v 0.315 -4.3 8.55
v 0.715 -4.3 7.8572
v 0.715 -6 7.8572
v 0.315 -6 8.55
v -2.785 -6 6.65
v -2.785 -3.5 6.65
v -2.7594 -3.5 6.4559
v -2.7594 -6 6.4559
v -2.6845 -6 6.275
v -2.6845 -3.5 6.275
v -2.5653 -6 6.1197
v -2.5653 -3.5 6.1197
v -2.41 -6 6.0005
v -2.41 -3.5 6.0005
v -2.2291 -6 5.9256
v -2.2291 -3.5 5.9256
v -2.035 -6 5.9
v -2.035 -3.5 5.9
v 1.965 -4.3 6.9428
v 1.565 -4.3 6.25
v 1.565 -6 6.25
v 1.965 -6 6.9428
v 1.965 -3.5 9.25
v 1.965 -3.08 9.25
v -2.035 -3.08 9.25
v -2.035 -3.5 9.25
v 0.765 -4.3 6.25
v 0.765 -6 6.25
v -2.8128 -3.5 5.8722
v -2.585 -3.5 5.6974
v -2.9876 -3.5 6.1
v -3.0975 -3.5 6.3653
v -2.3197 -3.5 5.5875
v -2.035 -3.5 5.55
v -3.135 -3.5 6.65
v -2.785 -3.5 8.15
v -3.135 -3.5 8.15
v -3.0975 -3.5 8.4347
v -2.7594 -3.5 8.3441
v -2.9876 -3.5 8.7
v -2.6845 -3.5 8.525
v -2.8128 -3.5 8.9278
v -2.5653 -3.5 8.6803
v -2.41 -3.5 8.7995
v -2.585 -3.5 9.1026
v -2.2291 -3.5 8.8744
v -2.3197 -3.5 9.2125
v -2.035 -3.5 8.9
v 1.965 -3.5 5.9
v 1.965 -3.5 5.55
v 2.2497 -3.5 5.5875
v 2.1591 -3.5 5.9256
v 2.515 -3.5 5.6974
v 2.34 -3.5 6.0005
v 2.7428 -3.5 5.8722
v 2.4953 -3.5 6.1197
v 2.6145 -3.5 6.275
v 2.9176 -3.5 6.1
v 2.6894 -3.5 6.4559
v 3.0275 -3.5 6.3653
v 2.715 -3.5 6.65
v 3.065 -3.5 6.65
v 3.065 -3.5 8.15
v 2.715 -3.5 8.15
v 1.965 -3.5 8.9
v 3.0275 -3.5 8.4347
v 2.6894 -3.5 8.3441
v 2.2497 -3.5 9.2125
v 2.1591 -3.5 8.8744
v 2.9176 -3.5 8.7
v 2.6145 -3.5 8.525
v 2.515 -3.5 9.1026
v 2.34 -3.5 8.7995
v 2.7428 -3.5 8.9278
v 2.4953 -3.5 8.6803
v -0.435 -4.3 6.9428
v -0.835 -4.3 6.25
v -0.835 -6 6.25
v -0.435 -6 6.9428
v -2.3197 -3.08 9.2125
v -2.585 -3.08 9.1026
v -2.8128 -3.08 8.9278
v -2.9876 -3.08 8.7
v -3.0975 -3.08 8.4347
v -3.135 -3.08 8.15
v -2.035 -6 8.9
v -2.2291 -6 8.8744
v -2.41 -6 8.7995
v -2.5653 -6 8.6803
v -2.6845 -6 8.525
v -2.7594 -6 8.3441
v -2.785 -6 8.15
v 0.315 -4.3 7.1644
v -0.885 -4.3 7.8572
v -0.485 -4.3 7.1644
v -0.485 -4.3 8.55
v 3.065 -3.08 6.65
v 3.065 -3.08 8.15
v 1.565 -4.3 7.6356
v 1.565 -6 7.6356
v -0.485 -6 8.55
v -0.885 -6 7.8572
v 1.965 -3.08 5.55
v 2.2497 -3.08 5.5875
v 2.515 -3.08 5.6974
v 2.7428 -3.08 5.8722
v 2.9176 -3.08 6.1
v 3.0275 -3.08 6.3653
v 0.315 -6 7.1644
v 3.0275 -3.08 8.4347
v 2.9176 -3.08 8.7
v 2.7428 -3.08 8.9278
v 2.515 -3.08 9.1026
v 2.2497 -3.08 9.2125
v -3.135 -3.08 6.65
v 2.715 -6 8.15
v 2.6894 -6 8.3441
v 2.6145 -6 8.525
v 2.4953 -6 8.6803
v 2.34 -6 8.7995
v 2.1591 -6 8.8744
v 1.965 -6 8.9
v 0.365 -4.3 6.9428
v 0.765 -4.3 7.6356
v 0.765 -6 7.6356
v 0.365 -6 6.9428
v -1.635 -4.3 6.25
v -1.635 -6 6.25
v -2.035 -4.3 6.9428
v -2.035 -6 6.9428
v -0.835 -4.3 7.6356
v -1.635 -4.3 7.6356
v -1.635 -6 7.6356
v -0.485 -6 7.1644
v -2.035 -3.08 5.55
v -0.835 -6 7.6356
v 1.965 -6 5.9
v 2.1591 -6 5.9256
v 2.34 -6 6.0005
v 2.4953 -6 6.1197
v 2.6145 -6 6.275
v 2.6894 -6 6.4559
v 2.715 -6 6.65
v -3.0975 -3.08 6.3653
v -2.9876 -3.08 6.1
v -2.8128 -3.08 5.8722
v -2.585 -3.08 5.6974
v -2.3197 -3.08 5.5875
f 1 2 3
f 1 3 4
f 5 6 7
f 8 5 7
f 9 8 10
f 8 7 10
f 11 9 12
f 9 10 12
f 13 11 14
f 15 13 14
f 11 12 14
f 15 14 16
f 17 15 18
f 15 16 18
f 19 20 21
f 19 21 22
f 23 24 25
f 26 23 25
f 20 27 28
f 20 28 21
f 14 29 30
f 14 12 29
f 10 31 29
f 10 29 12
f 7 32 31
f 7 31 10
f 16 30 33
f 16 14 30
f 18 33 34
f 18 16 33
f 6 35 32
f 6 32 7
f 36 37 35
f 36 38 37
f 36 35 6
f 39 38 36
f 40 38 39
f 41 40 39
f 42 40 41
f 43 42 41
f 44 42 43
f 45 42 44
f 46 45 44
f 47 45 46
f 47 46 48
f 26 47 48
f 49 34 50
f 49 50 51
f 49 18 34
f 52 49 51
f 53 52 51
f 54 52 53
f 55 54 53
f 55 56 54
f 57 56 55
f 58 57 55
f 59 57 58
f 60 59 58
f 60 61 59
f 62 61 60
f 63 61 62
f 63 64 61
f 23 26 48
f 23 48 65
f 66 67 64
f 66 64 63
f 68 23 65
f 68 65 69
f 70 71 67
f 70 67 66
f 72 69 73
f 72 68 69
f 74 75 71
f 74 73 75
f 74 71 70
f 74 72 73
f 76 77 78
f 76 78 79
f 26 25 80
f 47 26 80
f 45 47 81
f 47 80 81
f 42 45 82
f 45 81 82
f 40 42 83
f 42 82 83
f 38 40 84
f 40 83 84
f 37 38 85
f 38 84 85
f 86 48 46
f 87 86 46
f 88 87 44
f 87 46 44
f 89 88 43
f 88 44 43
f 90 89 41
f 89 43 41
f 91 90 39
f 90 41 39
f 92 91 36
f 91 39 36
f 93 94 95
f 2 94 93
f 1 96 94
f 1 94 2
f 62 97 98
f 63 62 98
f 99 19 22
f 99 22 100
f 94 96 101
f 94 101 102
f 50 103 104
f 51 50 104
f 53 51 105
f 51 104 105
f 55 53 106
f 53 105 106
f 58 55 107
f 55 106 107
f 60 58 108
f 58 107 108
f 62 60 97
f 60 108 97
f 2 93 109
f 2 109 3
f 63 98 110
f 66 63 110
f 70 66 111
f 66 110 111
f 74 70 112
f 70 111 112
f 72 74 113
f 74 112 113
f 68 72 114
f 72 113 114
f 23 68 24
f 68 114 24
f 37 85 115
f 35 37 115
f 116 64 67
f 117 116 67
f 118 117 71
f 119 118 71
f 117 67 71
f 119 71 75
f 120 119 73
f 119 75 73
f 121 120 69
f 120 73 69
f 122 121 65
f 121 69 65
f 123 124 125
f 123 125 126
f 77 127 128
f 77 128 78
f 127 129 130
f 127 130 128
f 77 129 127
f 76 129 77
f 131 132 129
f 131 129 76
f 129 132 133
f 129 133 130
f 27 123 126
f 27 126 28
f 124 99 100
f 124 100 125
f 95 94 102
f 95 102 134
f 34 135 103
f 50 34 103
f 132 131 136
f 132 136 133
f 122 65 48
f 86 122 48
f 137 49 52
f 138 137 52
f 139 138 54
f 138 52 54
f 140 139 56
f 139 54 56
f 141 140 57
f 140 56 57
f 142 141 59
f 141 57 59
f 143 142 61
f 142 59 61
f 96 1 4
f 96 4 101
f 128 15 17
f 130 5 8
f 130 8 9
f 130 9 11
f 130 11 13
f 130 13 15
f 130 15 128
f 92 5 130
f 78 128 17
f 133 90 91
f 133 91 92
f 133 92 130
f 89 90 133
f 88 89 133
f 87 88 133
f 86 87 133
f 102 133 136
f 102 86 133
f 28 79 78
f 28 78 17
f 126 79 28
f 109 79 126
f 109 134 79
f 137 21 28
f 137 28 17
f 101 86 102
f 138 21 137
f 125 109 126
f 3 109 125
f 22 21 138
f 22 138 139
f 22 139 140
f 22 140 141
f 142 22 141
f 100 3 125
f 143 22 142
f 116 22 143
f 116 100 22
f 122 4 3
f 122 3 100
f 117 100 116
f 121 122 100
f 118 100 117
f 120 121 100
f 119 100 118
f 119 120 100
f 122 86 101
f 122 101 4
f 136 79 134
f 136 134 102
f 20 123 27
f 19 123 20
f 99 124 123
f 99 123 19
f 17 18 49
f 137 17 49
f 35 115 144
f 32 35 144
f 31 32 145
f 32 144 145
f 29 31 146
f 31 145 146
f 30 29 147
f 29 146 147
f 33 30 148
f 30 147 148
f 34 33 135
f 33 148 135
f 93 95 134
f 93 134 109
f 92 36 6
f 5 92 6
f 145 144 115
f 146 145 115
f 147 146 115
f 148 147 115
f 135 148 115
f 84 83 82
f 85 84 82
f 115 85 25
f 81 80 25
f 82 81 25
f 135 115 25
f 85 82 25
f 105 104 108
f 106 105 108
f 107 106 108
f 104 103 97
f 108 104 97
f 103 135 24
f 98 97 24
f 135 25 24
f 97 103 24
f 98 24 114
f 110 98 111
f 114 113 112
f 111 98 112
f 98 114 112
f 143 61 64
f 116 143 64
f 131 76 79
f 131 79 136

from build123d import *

# Parameters (mm, degrees)
PAD010_START    = 3.08
PAD010_DEPTH    = 0.42
PAD011_START    = 3.5
PAD011_DEPTH    = 2.5
POCKET013_START = 4.3
POCKET013_DEPTH = 5.7


with BuildPart() as part:
    # Sketch026 → Pad010 (new body)
    with BuildSketch(Plane.XZ.offset(PAD010_START)):
        with BuildLine():
            Line((6.164998, 8.15), (6.164998, 6.65))
            ThreePointArc((6.164998, 6.65), (6.48718, 5.872183), (7.264998, 5.55))
            Line((7.264998, 5.55), (11.264998, 5.55))
            ThreePointArc((11.264998, 5.55), (12.042815, 5.872183), (12.364998, 6.65))
            Line((12.364998, 6.65), (12.364998, 8.15))
            ThreePointArc((12.364998, 8.15), (12.042815, 8.927817), (11.264998, 9.25))
            Line((11.264998, 9.25), (7.264998, 9.25))
            ThreePointArc((7.264998, 9.25), (6.48718, 8.927817), (6.164998, 8.15))
        make_face()
    extrude(amount=PAD010_DEPTH)

    # Sketch027 → Pad011 (join)
    with BuildSketch(Plane.XZ.offset(PAD011_START)):
        with BuildLine():
            Line((6.514998, 8.15), (6.514998, 6.65))
            ThreePointArc((6.514998, 6.65), (6.734668, 6.11967), (7.264998, 5.9))
            Line((7.264998, 5.9), (11.264998, 5.9))
            ThreePointArc((11.264998, 5.9), (11.795328, 6.11967), (12.014998, 6.65))
            Line((12.014998, 6.65), (12.014998, 8.15))
            ThreePointArc((12.014998, 8.15), (11.795328, 8.68033), (11.264998, 8.9))
            Line((11.264998, 8.9), (7.264998, 8.9))
            ThreePointArc((7.264998, 8.9), (6.734668, 8.68033), (6.514998, 8.15))
        make_face()
    extrude(amount=PAD011_DEPTH)


with BuildPart() as part_1:
    # Body006 placement: moved
    add(part.part.moved(Location((0, -0.68, 0))))


with BuildPart() as part_2:
    # Clone003 placement: moved
    add(part_1.part.moved(Location((0, 0.68, 0))))

    # Sketch029 → Pocket013 (cut)
    with BuildSketch(Plane.XZ.offset(POCKET013_START)):
        Polygon((8.864998, 6.94282), (8.464998, 7.635641), (7.664998, 7.635641), (7.264998, 6.94282), (7.664998, 6.25), (8.464998, 6.25), align=None)
        Polygon((10.014998, 7.85718), (9.614998, 8.55), (8.814998, 8.55), (8.414998, 7.85718), (8.814998, 7.164359), (9.614998, 7.164359), align=None)
        Polygon((11.264998, 6.94282), (10.864998, 7.635641), (10.064998, 7.635641), (9.664998, 6.94282), (10.064998, 6.25), (10.864998, 6.25), align=None)
    extrude(amount=POCKET013_DEPTH, mode=Mode.SUBTRACT)


with BuildPart() as part_3:
    # Body009 placement: moved
    add(part_2.part.moved(Location((-9.3, 0, 0))))


solid = part_3.part
